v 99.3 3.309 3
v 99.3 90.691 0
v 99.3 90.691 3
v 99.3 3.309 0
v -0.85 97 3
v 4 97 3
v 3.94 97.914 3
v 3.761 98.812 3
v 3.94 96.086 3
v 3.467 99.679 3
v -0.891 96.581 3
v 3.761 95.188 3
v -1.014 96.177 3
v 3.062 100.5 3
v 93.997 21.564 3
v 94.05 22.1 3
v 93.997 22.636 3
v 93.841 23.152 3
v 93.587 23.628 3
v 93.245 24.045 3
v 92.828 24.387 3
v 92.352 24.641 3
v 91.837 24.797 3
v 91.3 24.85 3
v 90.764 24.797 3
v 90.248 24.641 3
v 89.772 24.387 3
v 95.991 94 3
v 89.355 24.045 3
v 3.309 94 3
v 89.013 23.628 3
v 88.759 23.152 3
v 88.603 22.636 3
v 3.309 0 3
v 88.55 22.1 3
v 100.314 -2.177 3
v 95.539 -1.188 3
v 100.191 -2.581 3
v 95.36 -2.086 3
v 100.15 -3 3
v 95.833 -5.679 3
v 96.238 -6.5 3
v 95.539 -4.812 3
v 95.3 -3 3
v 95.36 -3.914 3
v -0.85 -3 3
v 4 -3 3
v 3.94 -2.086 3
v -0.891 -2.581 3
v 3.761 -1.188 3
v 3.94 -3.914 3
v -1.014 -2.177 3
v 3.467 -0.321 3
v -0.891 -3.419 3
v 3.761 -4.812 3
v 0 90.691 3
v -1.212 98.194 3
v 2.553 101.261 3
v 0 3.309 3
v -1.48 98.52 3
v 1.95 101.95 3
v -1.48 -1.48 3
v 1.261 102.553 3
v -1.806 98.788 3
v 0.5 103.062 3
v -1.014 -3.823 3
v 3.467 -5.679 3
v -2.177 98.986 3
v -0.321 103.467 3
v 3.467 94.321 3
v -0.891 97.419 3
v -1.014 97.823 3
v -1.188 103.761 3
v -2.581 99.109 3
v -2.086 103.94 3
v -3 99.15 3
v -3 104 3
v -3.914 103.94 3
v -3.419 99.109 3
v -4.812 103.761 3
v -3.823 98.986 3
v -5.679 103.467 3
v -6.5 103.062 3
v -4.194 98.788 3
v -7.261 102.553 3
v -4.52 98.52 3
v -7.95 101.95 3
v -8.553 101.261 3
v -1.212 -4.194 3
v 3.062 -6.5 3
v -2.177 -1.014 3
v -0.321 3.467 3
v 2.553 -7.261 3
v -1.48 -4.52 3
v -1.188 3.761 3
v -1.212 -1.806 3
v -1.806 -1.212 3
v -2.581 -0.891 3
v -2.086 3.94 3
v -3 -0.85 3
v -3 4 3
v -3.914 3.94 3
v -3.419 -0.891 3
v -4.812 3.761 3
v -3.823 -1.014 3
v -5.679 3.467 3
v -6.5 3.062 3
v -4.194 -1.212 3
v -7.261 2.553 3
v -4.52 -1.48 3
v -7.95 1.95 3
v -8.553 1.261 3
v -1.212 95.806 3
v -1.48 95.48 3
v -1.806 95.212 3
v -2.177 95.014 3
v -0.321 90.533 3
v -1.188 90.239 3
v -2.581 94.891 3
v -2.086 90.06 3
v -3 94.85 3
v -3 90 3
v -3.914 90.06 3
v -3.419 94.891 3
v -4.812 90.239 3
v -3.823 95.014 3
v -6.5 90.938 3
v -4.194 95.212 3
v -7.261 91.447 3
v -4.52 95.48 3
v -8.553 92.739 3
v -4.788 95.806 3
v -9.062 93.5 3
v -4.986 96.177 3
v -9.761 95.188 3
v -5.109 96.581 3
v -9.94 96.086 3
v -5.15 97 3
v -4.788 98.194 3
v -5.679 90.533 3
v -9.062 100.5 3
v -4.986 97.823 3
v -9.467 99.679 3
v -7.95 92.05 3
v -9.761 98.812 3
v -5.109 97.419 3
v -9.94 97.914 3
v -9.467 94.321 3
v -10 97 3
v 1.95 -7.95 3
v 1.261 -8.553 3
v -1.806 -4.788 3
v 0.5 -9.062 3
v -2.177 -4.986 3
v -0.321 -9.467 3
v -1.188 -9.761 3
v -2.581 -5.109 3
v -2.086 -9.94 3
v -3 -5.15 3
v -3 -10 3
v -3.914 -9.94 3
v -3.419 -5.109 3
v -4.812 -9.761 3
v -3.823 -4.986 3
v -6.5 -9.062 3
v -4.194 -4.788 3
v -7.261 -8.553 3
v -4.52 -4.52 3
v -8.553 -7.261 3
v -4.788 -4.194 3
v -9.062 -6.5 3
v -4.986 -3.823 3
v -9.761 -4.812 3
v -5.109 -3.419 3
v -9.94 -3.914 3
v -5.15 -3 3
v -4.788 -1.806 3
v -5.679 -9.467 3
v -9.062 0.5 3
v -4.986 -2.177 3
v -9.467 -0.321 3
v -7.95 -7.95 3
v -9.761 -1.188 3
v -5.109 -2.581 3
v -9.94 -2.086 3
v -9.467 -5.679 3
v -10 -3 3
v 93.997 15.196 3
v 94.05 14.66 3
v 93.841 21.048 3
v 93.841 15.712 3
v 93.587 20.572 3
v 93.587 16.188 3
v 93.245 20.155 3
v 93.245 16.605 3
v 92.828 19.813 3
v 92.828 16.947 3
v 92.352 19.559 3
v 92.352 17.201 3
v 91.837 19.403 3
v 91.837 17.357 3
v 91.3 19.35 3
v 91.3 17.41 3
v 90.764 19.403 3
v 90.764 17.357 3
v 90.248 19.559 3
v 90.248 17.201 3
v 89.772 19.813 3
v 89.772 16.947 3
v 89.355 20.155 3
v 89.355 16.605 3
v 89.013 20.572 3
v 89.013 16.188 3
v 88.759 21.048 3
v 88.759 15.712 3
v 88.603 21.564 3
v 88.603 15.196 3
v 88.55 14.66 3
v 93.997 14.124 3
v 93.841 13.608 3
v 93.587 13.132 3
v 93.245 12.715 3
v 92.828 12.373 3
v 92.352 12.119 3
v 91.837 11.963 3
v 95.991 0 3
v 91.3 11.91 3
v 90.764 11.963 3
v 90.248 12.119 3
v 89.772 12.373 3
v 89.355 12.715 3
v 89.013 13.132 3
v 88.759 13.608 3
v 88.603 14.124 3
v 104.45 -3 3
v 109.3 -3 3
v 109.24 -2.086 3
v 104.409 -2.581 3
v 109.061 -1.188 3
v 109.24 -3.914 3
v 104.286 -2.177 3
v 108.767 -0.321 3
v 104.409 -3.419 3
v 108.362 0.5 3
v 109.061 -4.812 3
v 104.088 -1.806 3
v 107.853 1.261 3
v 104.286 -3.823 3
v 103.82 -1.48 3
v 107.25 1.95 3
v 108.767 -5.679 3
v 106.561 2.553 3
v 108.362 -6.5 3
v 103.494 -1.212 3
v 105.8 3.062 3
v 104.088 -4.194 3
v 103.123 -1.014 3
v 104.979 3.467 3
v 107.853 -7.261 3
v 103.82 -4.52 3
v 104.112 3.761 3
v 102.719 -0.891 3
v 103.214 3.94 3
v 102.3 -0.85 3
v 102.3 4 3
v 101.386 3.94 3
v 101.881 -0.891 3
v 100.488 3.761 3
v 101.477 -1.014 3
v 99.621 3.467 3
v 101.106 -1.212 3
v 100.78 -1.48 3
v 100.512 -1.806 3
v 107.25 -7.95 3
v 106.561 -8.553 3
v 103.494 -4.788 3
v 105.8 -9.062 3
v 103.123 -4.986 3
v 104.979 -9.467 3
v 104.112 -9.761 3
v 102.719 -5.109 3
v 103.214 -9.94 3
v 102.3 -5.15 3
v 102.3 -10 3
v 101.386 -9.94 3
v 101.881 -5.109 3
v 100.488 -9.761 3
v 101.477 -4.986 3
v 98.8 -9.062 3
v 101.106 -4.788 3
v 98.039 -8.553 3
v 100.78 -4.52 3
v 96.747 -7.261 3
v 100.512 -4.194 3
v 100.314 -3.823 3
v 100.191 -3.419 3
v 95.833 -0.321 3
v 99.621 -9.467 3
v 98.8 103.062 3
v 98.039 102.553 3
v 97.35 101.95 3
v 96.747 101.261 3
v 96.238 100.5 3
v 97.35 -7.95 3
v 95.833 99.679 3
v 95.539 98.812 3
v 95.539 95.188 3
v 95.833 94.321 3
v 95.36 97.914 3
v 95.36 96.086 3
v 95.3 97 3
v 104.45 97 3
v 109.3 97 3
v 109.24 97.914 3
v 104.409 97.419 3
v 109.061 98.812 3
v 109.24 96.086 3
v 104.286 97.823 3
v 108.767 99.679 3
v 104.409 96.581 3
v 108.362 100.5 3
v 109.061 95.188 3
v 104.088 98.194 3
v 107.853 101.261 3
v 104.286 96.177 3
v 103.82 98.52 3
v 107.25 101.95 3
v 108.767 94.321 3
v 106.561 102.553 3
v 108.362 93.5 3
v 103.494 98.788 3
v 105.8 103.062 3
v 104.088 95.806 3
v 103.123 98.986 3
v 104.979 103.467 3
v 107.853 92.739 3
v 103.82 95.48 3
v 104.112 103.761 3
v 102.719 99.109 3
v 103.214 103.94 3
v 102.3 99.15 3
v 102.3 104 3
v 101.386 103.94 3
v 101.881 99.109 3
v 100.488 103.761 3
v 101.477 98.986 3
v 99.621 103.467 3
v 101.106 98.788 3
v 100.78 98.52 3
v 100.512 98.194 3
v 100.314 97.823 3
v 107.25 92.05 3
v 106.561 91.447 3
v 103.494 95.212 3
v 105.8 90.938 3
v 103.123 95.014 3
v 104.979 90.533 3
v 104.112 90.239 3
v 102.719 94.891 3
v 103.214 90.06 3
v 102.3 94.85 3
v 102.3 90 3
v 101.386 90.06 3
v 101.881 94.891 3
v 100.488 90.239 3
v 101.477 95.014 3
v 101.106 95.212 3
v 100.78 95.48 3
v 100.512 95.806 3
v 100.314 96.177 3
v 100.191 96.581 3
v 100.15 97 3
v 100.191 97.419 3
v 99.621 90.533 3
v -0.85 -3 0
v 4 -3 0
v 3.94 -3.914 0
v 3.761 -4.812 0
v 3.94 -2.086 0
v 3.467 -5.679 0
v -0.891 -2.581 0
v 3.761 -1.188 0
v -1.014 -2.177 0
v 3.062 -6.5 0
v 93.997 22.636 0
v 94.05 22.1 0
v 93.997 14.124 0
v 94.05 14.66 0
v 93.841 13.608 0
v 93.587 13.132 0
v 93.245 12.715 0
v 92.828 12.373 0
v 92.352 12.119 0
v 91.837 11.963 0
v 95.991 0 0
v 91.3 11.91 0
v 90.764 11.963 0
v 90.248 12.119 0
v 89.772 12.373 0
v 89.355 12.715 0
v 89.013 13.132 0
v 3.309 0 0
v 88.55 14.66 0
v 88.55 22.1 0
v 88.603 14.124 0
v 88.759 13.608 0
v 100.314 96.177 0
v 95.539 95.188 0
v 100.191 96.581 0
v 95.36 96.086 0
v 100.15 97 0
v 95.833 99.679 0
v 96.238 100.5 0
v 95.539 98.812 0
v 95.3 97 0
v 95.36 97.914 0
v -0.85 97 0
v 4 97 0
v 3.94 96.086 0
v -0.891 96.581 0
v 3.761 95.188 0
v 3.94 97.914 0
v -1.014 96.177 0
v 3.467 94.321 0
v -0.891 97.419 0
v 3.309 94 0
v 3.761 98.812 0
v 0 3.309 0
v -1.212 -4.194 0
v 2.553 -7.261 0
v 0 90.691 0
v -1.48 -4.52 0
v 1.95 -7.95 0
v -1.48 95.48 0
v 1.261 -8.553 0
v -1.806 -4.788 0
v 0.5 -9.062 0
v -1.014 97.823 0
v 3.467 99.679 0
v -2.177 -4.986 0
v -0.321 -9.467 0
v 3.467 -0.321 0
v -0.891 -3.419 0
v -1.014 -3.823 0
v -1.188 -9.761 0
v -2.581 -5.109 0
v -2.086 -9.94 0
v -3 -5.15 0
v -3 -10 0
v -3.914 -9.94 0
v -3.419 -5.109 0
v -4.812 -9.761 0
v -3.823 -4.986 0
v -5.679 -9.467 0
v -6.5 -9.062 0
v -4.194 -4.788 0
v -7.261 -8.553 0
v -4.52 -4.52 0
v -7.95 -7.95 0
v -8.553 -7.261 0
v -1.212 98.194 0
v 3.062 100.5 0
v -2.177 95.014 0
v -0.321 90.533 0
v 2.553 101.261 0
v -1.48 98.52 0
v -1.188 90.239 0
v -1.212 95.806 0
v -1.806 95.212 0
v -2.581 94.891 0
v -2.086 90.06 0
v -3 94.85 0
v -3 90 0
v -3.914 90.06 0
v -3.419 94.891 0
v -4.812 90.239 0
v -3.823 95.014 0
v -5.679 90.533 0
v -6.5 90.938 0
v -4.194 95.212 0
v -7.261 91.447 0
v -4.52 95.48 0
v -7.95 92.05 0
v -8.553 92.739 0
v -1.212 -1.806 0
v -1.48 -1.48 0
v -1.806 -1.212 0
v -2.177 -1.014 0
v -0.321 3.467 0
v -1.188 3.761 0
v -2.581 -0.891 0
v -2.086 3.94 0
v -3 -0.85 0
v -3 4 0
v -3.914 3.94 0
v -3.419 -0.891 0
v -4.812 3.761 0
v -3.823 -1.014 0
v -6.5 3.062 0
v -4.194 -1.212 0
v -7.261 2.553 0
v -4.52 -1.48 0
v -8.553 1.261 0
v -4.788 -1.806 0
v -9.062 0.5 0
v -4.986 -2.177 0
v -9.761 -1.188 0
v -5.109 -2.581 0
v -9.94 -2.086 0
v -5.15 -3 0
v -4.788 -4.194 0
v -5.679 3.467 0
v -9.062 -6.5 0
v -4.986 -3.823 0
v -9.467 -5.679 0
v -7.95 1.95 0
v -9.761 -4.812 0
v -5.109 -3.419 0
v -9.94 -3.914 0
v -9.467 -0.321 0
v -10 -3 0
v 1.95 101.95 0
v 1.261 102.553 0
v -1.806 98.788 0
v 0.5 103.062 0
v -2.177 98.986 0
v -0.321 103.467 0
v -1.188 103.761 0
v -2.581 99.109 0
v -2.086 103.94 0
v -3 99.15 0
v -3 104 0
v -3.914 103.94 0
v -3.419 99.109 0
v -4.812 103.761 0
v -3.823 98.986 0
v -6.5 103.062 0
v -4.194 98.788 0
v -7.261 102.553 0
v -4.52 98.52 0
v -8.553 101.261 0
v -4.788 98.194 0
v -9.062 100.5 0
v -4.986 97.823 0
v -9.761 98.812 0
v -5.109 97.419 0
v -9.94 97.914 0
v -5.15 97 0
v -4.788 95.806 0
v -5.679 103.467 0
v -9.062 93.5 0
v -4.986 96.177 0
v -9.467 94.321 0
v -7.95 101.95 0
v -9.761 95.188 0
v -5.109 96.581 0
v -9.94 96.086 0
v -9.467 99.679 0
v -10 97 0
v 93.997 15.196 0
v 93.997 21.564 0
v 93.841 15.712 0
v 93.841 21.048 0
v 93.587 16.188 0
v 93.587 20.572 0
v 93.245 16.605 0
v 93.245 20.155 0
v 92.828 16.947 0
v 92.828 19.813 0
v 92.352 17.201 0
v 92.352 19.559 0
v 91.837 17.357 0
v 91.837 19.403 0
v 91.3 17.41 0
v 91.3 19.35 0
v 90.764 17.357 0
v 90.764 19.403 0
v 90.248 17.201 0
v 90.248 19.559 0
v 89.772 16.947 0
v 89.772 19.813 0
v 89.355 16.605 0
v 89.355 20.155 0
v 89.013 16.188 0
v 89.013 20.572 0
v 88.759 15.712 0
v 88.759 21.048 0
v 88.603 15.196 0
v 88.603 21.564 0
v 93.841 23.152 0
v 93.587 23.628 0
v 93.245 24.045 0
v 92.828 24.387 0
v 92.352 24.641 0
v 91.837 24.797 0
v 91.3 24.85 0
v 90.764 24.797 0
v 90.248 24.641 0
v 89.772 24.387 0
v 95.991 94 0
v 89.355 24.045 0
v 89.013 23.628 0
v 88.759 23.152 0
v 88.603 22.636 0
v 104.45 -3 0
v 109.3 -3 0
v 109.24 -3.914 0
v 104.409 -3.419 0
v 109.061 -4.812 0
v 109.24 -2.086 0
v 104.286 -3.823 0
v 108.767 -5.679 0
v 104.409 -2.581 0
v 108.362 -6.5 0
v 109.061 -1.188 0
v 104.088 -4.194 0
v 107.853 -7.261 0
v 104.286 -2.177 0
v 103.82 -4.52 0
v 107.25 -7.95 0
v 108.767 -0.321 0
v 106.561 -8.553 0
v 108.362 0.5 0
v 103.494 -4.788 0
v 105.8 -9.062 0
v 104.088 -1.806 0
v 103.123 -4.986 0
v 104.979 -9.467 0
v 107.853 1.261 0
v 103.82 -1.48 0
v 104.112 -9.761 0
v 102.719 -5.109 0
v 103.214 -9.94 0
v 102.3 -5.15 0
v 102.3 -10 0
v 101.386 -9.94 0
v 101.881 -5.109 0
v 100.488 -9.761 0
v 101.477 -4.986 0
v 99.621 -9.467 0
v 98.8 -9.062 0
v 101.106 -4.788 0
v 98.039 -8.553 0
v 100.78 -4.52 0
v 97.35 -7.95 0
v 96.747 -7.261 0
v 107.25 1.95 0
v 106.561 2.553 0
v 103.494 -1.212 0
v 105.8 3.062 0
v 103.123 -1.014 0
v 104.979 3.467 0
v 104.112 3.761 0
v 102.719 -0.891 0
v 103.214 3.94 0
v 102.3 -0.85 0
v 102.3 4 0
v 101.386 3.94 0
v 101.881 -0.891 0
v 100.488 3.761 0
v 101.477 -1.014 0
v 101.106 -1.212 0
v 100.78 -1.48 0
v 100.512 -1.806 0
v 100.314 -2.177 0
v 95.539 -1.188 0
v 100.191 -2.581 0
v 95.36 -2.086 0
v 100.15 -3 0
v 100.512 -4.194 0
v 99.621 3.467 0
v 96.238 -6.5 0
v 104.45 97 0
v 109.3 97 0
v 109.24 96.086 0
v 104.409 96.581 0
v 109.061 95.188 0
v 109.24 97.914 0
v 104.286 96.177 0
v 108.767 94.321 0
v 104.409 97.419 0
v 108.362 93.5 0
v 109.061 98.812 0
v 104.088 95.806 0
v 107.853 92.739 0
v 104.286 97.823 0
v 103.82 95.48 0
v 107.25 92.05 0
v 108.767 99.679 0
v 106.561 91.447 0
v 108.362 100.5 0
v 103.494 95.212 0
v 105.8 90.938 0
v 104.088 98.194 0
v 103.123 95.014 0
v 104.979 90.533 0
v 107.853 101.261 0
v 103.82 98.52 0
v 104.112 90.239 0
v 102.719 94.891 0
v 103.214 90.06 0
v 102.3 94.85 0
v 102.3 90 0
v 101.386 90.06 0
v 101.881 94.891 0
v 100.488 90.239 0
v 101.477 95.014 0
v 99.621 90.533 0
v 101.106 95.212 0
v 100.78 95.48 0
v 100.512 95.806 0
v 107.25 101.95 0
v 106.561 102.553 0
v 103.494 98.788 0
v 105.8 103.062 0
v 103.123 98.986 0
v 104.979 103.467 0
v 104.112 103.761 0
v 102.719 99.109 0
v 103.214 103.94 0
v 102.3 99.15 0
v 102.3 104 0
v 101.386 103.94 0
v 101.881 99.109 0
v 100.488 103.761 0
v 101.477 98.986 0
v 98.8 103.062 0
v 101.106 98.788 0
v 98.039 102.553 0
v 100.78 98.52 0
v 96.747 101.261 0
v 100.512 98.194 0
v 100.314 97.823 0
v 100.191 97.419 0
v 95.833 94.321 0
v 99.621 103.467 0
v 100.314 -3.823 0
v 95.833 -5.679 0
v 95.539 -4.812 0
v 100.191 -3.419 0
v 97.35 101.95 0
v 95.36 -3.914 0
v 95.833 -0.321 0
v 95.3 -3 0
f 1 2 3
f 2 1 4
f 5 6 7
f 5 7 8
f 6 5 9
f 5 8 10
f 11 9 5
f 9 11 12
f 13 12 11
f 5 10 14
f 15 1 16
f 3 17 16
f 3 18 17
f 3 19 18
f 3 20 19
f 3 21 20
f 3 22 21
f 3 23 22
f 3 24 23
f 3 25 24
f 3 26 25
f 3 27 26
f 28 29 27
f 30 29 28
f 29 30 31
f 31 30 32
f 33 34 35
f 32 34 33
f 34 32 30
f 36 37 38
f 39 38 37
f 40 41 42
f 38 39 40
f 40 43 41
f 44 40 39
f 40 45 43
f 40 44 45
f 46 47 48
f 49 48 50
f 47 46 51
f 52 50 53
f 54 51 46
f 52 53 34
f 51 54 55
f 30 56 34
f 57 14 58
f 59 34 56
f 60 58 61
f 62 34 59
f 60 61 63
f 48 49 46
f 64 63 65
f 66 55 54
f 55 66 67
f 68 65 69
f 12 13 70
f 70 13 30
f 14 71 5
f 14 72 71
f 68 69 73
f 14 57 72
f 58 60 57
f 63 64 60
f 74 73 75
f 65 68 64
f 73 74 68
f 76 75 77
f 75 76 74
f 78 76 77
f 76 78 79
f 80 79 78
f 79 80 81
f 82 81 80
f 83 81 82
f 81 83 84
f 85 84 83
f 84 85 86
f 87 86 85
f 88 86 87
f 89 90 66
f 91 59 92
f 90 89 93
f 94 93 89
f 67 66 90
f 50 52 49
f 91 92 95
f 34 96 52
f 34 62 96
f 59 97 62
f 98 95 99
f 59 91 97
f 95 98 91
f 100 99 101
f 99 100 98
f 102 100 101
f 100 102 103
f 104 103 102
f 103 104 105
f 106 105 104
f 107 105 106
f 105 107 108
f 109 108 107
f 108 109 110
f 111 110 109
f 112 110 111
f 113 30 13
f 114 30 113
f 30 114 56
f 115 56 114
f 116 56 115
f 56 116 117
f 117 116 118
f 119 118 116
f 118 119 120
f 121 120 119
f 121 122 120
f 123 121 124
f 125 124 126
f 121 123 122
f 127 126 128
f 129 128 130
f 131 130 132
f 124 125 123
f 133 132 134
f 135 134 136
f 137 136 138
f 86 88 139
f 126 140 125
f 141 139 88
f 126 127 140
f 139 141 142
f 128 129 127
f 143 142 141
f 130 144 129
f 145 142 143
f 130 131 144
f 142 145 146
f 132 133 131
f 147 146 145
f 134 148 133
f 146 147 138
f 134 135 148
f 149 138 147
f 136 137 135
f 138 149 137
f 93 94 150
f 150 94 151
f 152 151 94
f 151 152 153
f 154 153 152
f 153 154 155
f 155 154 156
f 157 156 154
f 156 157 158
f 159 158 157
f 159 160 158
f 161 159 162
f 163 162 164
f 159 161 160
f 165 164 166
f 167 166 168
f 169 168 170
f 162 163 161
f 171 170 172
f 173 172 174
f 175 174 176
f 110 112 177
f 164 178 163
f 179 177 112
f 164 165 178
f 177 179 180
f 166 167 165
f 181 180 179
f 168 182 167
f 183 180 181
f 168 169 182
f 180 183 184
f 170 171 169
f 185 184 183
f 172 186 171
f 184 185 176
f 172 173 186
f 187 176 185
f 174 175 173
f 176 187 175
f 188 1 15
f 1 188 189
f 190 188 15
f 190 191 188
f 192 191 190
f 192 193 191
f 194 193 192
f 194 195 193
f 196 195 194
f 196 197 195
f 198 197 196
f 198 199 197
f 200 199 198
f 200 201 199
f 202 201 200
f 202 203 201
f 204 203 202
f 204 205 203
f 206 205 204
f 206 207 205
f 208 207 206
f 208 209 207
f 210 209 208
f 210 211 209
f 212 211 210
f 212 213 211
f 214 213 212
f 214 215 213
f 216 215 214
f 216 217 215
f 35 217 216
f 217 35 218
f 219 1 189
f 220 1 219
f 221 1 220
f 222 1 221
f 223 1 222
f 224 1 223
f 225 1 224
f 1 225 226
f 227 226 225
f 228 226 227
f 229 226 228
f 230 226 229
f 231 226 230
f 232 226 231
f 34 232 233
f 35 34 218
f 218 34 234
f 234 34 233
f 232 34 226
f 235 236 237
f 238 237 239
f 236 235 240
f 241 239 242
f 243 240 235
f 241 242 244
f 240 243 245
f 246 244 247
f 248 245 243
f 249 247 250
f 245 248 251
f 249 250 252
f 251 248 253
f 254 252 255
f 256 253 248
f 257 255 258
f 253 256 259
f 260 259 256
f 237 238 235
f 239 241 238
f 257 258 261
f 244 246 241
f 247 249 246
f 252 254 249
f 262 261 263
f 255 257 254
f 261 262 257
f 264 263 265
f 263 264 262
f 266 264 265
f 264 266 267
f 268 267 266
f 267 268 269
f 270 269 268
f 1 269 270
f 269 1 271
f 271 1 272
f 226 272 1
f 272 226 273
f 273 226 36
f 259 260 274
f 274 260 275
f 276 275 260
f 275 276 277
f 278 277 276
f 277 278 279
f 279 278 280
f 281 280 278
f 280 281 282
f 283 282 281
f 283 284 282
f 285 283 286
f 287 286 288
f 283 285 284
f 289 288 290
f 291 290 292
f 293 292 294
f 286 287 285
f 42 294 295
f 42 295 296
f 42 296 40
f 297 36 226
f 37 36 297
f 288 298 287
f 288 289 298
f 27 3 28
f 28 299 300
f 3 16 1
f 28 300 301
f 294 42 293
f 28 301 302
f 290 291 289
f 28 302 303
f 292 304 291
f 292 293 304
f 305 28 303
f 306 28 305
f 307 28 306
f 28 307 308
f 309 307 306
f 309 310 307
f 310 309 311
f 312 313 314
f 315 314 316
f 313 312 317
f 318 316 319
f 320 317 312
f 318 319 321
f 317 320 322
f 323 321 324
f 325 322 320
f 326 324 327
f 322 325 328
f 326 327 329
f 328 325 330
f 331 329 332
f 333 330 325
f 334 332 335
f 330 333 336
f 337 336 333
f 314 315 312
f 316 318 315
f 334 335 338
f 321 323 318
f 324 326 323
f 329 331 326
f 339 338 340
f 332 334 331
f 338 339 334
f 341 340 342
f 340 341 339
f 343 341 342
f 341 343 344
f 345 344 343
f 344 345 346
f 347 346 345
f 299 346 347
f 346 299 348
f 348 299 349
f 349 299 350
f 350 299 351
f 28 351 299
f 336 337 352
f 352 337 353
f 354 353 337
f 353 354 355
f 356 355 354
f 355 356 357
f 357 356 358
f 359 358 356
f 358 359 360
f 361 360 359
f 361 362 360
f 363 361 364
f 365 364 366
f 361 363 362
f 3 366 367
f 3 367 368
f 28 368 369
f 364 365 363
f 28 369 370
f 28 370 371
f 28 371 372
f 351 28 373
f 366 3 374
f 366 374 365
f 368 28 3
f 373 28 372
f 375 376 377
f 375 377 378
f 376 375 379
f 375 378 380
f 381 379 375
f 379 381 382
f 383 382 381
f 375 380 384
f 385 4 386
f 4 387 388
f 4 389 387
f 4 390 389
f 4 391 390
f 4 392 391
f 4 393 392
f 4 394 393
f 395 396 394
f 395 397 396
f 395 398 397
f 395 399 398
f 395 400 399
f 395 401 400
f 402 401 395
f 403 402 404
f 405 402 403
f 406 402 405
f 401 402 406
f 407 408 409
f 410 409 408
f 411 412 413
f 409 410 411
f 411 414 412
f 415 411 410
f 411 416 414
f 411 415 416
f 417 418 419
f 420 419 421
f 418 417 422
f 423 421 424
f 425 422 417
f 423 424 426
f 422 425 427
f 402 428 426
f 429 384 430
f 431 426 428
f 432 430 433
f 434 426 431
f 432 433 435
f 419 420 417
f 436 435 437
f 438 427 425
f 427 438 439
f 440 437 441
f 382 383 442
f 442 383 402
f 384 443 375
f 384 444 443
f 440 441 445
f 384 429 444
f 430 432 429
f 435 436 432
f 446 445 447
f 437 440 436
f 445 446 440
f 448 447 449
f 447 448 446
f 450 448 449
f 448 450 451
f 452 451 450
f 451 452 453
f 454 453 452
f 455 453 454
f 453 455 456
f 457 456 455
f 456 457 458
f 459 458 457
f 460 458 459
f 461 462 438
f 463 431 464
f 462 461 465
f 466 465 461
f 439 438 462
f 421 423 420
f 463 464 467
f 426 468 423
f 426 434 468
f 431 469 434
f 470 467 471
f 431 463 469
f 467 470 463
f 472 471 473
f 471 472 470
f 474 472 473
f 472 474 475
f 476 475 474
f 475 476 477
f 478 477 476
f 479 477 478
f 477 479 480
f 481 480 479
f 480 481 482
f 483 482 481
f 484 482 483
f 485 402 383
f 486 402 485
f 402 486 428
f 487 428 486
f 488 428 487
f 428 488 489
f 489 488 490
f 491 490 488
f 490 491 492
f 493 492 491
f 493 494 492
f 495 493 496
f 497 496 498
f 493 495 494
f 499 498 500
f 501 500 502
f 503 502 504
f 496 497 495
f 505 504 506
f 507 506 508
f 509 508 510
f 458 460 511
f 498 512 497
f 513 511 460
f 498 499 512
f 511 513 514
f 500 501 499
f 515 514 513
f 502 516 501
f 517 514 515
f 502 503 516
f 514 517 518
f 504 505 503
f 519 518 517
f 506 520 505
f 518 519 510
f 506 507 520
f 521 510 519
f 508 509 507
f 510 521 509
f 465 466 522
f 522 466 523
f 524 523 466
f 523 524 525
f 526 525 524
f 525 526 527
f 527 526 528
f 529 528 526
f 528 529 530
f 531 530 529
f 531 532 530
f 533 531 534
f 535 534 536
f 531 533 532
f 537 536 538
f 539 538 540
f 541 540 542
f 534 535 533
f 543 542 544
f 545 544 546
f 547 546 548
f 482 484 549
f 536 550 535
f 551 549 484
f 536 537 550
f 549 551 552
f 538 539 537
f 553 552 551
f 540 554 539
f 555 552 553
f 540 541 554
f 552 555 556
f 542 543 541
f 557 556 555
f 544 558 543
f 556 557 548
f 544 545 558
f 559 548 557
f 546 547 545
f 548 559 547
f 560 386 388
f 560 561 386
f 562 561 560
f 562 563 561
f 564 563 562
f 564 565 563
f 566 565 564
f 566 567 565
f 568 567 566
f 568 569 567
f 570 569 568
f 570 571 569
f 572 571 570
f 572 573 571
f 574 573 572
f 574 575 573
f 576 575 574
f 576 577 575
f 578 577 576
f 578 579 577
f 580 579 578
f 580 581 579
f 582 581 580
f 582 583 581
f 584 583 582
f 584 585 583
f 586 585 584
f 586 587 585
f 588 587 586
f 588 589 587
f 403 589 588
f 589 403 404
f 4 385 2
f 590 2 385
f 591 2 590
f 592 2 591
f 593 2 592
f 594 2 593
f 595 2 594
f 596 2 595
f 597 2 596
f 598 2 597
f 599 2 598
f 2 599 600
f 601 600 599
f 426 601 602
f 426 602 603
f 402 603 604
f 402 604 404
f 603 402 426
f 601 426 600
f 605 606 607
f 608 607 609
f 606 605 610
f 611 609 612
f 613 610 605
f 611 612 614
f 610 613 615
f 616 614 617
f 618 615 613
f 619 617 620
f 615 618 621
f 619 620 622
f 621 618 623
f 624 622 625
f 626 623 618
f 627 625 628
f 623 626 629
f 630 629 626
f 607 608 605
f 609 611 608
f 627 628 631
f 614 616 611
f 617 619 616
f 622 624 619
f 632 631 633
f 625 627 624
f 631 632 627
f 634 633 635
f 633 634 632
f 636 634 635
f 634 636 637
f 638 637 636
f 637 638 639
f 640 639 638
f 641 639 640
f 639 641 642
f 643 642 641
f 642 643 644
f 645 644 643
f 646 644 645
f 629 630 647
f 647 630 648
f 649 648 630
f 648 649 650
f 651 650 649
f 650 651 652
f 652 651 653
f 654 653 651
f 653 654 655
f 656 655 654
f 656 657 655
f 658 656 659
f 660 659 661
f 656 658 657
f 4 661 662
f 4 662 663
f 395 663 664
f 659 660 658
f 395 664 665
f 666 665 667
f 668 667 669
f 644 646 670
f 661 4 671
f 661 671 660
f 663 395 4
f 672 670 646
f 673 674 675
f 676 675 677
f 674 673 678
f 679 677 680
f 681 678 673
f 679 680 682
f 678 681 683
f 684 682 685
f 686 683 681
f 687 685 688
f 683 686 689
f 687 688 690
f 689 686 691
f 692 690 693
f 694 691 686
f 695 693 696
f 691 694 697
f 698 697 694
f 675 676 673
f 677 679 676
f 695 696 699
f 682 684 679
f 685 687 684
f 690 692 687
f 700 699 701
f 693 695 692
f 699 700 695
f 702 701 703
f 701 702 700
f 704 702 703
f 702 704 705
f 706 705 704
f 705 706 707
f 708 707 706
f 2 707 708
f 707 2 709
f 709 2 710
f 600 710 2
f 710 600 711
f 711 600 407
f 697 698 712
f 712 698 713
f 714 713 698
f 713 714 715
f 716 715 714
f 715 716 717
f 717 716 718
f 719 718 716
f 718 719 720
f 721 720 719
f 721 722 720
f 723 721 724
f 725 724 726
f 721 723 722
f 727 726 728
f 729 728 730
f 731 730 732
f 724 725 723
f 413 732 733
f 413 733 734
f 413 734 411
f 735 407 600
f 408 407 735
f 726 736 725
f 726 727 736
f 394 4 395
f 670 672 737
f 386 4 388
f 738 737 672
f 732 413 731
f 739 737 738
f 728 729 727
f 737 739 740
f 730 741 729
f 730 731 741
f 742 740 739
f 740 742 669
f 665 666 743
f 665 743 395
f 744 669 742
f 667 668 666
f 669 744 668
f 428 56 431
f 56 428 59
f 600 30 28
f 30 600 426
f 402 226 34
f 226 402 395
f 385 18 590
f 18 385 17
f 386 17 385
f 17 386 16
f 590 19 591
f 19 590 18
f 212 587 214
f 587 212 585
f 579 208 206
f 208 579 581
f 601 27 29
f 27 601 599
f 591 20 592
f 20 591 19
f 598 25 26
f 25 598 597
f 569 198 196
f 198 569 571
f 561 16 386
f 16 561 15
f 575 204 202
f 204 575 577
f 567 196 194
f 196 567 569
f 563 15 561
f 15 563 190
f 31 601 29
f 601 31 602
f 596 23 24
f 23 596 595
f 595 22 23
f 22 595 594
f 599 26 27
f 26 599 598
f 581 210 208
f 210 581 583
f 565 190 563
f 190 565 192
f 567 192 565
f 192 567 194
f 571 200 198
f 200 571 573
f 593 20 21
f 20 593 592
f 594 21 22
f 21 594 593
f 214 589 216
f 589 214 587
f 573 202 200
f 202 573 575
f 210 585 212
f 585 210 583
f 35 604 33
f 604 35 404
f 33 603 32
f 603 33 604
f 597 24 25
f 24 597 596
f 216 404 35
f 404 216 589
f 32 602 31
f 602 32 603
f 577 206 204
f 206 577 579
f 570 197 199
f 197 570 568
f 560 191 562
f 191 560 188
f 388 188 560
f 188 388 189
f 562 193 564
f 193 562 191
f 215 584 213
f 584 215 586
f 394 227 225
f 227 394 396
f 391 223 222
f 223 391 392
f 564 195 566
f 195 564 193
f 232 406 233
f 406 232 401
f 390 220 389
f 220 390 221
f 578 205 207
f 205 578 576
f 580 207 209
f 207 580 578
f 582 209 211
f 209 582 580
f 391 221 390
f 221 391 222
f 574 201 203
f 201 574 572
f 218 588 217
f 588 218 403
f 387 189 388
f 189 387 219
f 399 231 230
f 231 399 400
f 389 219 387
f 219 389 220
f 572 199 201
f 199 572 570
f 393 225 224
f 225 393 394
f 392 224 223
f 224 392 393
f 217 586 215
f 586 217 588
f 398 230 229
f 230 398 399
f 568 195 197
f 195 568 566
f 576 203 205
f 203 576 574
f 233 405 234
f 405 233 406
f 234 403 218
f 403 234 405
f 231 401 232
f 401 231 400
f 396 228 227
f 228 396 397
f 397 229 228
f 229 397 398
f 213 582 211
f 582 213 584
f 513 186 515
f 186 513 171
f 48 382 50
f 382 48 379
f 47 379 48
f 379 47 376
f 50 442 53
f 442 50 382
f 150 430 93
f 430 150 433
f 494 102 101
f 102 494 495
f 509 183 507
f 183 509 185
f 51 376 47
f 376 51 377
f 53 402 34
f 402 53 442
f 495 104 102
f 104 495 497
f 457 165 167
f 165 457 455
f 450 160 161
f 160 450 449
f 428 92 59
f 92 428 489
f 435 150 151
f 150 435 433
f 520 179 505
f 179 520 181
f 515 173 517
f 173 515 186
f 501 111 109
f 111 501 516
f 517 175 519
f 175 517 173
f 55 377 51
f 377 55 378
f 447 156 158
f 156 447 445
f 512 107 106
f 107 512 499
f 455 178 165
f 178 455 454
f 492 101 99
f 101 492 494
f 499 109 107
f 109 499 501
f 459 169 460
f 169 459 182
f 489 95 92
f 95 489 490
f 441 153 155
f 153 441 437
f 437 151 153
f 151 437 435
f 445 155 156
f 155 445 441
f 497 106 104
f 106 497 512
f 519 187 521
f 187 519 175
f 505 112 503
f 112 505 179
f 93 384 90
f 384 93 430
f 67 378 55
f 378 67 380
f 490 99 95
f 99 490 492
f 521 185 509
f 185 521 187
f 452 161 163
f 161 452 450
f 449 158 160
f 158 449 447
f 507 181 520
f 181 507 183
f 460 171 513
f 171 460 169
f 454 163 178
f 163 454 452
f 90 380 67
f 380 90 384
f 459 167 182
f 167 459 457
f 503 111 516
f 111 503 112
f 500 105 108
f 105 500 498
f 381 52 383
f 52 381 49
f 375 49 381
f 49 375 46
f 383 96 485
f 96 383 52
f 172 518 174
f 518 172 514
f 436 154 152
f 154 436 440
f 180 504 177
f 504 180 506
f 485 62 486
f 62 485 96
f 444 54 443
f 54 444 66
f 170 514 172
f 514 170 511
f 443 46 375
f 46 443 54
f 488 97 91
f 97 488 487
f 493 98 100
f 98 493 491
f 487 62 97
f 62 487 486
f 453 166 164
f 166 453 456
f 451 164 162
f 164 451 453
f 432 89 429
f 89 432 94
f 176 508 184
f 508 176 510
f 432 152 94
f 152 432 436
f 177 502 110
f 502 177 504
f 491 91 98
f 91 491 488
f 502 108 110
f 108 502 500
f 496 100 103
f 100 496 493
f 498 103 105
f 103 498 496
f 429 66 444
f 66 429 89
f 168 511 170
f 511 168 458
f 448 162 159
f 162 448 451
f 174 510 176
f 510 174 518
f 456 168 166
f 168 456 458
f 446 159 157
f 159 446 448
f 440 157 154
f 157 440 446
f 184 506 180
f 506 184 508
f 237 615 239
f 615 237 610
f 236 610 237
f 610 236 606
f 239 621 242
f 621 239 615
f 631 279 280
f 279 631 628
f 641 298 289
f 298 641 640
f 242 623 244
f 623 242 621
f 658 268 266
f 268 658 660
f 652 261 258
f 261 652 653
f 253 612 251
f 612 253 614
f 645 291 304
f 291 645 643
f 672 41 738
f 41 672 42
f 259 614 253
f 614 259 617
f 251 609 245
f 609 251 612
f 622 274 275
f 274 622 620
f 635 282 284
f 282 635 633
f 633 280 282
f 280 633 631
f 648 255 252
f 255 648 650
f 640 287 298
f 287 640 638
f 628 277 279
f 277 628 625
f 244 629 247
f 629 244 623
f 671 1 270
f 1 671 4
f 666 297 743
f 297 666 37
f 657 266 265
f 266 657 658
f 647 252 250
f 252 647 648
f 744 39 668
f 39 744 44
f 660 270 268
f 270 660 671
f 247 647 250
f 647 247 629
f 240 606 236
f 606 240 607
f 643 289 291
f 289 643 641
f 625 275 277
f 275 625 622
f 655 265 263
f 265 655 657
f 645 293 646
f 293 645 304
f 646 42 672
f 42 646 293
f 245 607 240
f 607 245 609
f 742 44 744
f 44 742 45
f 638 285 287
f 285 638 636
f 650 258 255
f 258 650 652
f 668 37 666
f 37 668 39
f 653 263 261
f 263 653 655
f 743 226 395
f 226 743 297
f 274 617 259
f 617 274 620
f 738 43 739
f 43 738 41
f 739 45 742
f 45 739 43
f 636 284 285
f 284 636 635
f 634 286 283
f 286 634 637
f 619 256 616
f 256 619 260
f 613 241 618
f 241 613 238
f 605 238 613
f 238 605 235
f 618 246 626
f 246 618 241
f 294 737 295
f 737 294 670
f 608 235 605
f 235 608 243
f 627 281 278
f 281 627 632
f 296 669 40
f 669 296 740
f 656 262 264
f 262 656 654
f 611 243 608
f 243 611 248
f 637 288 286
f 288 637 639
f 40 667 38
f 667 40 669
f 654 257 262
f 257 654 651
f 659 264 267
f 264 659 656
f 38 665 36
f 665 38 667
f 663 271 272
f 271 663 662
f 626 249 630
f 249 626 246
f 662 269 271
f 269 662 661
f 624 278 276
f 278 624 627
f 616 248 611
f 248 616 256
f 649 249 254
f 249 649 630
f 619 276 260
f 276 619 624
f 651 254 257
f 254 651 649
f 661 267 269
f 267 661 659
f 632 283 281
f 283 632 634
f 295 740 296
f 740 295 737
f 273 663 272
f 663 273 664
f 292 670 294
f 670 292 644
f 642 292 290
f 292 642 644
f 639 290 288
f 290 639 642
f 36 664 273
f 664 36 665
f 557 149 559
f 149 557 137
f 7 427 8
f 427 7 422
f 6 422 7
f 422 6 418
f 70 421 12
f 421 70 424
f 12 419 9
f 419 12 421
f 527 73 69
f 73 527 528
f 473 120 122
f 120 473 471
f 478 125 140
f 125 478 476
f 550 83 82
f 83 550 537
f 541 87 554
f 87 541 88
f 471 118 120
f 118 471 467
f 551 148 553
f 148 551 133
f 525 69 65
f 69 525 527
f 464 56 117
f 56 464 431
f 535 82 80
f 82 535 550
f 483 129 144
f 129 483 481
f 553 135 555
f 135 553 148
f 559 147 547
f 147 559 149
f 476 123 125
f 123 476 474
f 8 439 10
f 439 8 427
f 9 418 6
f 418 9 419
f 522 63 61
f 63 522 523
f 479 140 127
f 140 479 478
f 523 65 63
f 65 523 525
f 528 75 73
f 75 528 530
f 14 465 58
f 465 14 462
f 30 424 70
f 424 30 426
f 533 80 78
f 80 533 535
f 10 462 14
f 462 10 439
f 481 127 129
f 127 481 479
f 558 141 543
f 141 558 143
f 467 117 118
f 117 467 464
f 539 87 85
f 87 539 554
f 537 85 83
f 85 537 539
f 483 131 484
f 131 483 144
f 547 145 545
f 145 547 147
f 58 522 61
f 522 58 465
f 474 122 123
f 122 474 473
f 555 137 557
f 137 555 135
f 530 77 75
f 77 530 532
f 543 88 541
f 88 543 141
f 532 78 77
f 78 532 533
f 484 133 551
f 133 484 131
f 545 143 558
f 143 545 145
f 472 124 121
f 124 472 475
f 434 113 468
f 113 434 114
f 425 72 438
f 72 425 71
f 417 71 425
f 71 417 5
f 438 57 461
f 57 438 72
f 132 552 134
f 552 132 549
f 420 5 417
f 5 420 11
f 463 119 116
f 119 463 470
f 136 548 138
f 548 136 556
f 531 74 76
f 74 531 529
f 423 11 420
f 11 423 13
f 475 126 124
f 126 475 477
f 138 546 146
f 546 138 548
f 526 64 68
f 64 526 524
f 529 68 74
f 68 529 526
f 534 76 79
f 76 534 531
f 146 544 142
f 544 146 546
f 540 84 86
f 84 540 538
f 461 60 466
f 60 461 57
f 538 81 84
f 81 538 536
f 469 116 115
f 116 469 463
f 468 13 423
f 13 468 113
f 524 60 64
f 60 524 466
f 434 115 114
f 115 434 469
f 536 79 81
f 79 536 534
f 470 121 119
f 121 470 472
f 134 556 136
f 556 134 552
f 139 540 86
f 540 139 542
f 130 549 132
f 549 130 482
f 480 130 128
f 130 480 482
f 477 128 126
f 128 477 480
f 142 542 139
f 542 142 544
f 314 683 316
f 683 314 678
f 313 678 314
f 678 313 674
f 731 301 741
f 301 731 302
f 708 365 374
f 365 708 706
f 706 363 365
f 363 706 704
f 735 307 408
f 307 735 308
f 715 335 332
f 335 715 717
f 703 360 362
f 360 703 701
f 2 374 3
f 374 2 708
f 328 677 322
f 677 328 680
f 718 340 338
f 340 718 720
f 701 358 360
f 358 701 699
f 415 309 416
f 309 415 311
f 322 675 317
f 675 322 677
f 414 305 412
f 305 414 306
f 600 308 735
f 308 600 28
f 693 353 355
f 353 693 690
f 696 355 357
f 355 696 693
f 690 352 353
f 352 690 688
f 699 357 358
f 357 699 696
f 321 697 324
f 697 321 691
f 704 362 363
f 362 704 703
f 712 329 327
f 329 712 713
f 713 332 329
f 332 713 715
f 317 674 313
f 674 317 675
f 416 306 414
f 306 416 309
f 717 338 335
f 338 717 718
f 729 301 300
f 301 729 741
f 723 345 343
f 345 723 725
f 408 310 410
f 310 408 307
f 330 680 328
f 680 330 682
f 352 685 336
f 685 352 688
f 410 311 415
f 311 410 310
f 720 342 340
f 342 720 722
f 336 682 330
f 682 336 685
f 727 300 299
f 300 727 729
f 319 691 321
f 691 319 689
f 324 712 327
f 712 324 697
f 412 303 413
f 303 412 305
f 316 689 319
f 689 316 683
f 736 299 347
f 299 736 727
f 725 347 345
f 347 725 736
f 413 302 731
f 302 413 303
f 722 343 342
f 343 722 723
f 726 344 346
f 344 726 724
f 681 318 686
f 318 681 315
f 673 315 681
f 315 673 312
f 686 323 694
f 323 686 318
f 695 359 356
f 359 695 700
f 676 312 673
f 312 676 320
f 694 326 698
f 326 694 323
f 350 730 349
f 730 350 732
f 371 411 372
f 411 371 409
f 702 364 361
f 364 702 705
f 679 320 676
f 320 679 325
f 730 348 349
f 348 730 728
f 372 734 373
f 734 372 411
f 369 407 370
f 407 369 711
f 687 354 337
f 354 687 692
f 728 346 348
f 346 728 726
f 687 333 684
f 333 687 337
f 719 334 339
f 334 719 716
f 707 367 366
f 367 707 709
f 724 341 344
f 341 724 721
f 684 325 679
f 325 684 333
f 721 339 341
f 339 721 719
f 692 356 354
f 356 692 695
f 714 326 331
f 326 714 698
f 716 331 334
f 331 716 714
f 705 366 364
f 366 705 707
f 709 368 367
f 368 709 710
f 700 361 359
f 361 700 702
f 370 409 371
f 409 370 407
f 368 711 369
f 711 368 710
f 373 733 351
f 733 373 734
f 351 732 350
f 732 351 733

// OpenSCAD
// ============================================================
// Gabinete - ModemEYSE4G_LTE_Cat1_simA7670SA - TAPA
// Pieza separada: solo la tapa superior, con los calados de
// los LEDs D2/D3. La base esta en el archivo
// gabinete_ModemEYSE4G_base_6.scad
// Mismo sistema de coordenadas y mismos parametros de placa
// que la base, para que las dimensiones exteriores coincidan.
// ============================================================

// ---------- PARAMETROS DE LA PLACA ----------
board_x = 90.3;         // ancho de la placa (mm)
board_y = 85.0;         // alto de la placa (mm)

// ---------- PARAMETROS DEL GABINETE ----------
wall = 3.0;             // espesor de pared, hacia afuera (mm) - definido por Damian
lid_thickness = 3.0;    // espesor de la tapa superior - definido por Damian
clearance_xy = 1.5;     // holgura alrededor de la placa (mm)

// ---------- ESPEJADO EN X ----------
// Mismo criterio que en la base: las coordenadas X de los LEDs se
// espejan porque la placa se monta con la cara de componentes hacia
// arriba, invirtiendo el eje X respecto a como lo guarda KiCad.
mirror_x = true;
function mx(x) = mirror_x ? (board_x - x) : x;

// ---------- LEDS (calado en la tapa) ----------
// Coordenadas X crudas de KiCad, ya pasadas por mx().
led_D2 = [mx(3.5), 17.6];
led_D3 = [mx(3.5), 10.16];
led_hole_d = 5.5; // LED THT de 5mm + holgura - AJUSTAR a gusto (diametro real vs. luz difusa)

// ============================================================
// MODULO
// ============================================================

// Dimensiones exteriores totales de la caja (deben coincidir con las
// de gabinete_ModemEYSE4G_base_6.scad para que la tapa calce bien)
outer_x = board_x + 2 * (wall + clearance_xy);
outer_y = board_y + 2 * (wall + clearance_xy);
offset_x = wall + clearance_xy; // offset del (0,0) de la placa dentro de la caja
offset_y = wall + clearance_xy;

// ---------- OREJITAS DE SUJECION TAPA-BASE ----------
// Mismos centros que en gabinete_ModemEYSE4G_base_6.scad - deben
// coincidir exactamente para que los agujeros calcen con los de la base.
ear_clearance_d = 4.3;   // agujero pasante en la tapa (holgura sobre tornillo de 5/32")
ear_d = 14;               // diametro de la orejita
ear_reach = 3;            // mismo valor que en la base

ear_centers = [
    [-ear_reach, -ear_reach],
    [outer_x + ear_reach, -ear_reach],
    [-ear_reach, outer_y + ear_reach],
    [outer_x + ear_reach, outer_y + ear_reach]
];

module orejita_tapa(p) {
    difference() {
        translate([p[0], p[1], 0])
            cylinder(h = lid_thickness, d = ear_d, $fn = 48);
        translate([p[0], p[1], -1])
            cylinder(h = lid_thickness + 2, d = ear_clearance_d, $fn = 32);
    }
}

module orejitas_tapa() {
    for (p = ear_centers) orejita_tapa(p);
}

// Tapa superior: mismas dimensiones XY exteriores que la caja,
// espesor lid_thickness. Se imprime aparte y se apoya sobre el
// borde superior de las paredes.
module tapa() {
    difference() {
        cube([outer_x, outer_y, lid_thickness]);

        // Calados de los LEDs D2 y D3 (posicion real tomada del PCB)
        translate([led_D2[0] + offset_x, led_D2[1] + offset_y, -1])
            cylinder(h = lid_thickness + 2, d = led_hole_d, $fn = 32);
        translate([led_D3[0] + offset_x, led_D3[1] + offset_y, -1])
            cylinder(h = lid_thickness + 2, d = led_hole_d, $fn = 32);
    }
}

tapa();
orejitas_tapa();
